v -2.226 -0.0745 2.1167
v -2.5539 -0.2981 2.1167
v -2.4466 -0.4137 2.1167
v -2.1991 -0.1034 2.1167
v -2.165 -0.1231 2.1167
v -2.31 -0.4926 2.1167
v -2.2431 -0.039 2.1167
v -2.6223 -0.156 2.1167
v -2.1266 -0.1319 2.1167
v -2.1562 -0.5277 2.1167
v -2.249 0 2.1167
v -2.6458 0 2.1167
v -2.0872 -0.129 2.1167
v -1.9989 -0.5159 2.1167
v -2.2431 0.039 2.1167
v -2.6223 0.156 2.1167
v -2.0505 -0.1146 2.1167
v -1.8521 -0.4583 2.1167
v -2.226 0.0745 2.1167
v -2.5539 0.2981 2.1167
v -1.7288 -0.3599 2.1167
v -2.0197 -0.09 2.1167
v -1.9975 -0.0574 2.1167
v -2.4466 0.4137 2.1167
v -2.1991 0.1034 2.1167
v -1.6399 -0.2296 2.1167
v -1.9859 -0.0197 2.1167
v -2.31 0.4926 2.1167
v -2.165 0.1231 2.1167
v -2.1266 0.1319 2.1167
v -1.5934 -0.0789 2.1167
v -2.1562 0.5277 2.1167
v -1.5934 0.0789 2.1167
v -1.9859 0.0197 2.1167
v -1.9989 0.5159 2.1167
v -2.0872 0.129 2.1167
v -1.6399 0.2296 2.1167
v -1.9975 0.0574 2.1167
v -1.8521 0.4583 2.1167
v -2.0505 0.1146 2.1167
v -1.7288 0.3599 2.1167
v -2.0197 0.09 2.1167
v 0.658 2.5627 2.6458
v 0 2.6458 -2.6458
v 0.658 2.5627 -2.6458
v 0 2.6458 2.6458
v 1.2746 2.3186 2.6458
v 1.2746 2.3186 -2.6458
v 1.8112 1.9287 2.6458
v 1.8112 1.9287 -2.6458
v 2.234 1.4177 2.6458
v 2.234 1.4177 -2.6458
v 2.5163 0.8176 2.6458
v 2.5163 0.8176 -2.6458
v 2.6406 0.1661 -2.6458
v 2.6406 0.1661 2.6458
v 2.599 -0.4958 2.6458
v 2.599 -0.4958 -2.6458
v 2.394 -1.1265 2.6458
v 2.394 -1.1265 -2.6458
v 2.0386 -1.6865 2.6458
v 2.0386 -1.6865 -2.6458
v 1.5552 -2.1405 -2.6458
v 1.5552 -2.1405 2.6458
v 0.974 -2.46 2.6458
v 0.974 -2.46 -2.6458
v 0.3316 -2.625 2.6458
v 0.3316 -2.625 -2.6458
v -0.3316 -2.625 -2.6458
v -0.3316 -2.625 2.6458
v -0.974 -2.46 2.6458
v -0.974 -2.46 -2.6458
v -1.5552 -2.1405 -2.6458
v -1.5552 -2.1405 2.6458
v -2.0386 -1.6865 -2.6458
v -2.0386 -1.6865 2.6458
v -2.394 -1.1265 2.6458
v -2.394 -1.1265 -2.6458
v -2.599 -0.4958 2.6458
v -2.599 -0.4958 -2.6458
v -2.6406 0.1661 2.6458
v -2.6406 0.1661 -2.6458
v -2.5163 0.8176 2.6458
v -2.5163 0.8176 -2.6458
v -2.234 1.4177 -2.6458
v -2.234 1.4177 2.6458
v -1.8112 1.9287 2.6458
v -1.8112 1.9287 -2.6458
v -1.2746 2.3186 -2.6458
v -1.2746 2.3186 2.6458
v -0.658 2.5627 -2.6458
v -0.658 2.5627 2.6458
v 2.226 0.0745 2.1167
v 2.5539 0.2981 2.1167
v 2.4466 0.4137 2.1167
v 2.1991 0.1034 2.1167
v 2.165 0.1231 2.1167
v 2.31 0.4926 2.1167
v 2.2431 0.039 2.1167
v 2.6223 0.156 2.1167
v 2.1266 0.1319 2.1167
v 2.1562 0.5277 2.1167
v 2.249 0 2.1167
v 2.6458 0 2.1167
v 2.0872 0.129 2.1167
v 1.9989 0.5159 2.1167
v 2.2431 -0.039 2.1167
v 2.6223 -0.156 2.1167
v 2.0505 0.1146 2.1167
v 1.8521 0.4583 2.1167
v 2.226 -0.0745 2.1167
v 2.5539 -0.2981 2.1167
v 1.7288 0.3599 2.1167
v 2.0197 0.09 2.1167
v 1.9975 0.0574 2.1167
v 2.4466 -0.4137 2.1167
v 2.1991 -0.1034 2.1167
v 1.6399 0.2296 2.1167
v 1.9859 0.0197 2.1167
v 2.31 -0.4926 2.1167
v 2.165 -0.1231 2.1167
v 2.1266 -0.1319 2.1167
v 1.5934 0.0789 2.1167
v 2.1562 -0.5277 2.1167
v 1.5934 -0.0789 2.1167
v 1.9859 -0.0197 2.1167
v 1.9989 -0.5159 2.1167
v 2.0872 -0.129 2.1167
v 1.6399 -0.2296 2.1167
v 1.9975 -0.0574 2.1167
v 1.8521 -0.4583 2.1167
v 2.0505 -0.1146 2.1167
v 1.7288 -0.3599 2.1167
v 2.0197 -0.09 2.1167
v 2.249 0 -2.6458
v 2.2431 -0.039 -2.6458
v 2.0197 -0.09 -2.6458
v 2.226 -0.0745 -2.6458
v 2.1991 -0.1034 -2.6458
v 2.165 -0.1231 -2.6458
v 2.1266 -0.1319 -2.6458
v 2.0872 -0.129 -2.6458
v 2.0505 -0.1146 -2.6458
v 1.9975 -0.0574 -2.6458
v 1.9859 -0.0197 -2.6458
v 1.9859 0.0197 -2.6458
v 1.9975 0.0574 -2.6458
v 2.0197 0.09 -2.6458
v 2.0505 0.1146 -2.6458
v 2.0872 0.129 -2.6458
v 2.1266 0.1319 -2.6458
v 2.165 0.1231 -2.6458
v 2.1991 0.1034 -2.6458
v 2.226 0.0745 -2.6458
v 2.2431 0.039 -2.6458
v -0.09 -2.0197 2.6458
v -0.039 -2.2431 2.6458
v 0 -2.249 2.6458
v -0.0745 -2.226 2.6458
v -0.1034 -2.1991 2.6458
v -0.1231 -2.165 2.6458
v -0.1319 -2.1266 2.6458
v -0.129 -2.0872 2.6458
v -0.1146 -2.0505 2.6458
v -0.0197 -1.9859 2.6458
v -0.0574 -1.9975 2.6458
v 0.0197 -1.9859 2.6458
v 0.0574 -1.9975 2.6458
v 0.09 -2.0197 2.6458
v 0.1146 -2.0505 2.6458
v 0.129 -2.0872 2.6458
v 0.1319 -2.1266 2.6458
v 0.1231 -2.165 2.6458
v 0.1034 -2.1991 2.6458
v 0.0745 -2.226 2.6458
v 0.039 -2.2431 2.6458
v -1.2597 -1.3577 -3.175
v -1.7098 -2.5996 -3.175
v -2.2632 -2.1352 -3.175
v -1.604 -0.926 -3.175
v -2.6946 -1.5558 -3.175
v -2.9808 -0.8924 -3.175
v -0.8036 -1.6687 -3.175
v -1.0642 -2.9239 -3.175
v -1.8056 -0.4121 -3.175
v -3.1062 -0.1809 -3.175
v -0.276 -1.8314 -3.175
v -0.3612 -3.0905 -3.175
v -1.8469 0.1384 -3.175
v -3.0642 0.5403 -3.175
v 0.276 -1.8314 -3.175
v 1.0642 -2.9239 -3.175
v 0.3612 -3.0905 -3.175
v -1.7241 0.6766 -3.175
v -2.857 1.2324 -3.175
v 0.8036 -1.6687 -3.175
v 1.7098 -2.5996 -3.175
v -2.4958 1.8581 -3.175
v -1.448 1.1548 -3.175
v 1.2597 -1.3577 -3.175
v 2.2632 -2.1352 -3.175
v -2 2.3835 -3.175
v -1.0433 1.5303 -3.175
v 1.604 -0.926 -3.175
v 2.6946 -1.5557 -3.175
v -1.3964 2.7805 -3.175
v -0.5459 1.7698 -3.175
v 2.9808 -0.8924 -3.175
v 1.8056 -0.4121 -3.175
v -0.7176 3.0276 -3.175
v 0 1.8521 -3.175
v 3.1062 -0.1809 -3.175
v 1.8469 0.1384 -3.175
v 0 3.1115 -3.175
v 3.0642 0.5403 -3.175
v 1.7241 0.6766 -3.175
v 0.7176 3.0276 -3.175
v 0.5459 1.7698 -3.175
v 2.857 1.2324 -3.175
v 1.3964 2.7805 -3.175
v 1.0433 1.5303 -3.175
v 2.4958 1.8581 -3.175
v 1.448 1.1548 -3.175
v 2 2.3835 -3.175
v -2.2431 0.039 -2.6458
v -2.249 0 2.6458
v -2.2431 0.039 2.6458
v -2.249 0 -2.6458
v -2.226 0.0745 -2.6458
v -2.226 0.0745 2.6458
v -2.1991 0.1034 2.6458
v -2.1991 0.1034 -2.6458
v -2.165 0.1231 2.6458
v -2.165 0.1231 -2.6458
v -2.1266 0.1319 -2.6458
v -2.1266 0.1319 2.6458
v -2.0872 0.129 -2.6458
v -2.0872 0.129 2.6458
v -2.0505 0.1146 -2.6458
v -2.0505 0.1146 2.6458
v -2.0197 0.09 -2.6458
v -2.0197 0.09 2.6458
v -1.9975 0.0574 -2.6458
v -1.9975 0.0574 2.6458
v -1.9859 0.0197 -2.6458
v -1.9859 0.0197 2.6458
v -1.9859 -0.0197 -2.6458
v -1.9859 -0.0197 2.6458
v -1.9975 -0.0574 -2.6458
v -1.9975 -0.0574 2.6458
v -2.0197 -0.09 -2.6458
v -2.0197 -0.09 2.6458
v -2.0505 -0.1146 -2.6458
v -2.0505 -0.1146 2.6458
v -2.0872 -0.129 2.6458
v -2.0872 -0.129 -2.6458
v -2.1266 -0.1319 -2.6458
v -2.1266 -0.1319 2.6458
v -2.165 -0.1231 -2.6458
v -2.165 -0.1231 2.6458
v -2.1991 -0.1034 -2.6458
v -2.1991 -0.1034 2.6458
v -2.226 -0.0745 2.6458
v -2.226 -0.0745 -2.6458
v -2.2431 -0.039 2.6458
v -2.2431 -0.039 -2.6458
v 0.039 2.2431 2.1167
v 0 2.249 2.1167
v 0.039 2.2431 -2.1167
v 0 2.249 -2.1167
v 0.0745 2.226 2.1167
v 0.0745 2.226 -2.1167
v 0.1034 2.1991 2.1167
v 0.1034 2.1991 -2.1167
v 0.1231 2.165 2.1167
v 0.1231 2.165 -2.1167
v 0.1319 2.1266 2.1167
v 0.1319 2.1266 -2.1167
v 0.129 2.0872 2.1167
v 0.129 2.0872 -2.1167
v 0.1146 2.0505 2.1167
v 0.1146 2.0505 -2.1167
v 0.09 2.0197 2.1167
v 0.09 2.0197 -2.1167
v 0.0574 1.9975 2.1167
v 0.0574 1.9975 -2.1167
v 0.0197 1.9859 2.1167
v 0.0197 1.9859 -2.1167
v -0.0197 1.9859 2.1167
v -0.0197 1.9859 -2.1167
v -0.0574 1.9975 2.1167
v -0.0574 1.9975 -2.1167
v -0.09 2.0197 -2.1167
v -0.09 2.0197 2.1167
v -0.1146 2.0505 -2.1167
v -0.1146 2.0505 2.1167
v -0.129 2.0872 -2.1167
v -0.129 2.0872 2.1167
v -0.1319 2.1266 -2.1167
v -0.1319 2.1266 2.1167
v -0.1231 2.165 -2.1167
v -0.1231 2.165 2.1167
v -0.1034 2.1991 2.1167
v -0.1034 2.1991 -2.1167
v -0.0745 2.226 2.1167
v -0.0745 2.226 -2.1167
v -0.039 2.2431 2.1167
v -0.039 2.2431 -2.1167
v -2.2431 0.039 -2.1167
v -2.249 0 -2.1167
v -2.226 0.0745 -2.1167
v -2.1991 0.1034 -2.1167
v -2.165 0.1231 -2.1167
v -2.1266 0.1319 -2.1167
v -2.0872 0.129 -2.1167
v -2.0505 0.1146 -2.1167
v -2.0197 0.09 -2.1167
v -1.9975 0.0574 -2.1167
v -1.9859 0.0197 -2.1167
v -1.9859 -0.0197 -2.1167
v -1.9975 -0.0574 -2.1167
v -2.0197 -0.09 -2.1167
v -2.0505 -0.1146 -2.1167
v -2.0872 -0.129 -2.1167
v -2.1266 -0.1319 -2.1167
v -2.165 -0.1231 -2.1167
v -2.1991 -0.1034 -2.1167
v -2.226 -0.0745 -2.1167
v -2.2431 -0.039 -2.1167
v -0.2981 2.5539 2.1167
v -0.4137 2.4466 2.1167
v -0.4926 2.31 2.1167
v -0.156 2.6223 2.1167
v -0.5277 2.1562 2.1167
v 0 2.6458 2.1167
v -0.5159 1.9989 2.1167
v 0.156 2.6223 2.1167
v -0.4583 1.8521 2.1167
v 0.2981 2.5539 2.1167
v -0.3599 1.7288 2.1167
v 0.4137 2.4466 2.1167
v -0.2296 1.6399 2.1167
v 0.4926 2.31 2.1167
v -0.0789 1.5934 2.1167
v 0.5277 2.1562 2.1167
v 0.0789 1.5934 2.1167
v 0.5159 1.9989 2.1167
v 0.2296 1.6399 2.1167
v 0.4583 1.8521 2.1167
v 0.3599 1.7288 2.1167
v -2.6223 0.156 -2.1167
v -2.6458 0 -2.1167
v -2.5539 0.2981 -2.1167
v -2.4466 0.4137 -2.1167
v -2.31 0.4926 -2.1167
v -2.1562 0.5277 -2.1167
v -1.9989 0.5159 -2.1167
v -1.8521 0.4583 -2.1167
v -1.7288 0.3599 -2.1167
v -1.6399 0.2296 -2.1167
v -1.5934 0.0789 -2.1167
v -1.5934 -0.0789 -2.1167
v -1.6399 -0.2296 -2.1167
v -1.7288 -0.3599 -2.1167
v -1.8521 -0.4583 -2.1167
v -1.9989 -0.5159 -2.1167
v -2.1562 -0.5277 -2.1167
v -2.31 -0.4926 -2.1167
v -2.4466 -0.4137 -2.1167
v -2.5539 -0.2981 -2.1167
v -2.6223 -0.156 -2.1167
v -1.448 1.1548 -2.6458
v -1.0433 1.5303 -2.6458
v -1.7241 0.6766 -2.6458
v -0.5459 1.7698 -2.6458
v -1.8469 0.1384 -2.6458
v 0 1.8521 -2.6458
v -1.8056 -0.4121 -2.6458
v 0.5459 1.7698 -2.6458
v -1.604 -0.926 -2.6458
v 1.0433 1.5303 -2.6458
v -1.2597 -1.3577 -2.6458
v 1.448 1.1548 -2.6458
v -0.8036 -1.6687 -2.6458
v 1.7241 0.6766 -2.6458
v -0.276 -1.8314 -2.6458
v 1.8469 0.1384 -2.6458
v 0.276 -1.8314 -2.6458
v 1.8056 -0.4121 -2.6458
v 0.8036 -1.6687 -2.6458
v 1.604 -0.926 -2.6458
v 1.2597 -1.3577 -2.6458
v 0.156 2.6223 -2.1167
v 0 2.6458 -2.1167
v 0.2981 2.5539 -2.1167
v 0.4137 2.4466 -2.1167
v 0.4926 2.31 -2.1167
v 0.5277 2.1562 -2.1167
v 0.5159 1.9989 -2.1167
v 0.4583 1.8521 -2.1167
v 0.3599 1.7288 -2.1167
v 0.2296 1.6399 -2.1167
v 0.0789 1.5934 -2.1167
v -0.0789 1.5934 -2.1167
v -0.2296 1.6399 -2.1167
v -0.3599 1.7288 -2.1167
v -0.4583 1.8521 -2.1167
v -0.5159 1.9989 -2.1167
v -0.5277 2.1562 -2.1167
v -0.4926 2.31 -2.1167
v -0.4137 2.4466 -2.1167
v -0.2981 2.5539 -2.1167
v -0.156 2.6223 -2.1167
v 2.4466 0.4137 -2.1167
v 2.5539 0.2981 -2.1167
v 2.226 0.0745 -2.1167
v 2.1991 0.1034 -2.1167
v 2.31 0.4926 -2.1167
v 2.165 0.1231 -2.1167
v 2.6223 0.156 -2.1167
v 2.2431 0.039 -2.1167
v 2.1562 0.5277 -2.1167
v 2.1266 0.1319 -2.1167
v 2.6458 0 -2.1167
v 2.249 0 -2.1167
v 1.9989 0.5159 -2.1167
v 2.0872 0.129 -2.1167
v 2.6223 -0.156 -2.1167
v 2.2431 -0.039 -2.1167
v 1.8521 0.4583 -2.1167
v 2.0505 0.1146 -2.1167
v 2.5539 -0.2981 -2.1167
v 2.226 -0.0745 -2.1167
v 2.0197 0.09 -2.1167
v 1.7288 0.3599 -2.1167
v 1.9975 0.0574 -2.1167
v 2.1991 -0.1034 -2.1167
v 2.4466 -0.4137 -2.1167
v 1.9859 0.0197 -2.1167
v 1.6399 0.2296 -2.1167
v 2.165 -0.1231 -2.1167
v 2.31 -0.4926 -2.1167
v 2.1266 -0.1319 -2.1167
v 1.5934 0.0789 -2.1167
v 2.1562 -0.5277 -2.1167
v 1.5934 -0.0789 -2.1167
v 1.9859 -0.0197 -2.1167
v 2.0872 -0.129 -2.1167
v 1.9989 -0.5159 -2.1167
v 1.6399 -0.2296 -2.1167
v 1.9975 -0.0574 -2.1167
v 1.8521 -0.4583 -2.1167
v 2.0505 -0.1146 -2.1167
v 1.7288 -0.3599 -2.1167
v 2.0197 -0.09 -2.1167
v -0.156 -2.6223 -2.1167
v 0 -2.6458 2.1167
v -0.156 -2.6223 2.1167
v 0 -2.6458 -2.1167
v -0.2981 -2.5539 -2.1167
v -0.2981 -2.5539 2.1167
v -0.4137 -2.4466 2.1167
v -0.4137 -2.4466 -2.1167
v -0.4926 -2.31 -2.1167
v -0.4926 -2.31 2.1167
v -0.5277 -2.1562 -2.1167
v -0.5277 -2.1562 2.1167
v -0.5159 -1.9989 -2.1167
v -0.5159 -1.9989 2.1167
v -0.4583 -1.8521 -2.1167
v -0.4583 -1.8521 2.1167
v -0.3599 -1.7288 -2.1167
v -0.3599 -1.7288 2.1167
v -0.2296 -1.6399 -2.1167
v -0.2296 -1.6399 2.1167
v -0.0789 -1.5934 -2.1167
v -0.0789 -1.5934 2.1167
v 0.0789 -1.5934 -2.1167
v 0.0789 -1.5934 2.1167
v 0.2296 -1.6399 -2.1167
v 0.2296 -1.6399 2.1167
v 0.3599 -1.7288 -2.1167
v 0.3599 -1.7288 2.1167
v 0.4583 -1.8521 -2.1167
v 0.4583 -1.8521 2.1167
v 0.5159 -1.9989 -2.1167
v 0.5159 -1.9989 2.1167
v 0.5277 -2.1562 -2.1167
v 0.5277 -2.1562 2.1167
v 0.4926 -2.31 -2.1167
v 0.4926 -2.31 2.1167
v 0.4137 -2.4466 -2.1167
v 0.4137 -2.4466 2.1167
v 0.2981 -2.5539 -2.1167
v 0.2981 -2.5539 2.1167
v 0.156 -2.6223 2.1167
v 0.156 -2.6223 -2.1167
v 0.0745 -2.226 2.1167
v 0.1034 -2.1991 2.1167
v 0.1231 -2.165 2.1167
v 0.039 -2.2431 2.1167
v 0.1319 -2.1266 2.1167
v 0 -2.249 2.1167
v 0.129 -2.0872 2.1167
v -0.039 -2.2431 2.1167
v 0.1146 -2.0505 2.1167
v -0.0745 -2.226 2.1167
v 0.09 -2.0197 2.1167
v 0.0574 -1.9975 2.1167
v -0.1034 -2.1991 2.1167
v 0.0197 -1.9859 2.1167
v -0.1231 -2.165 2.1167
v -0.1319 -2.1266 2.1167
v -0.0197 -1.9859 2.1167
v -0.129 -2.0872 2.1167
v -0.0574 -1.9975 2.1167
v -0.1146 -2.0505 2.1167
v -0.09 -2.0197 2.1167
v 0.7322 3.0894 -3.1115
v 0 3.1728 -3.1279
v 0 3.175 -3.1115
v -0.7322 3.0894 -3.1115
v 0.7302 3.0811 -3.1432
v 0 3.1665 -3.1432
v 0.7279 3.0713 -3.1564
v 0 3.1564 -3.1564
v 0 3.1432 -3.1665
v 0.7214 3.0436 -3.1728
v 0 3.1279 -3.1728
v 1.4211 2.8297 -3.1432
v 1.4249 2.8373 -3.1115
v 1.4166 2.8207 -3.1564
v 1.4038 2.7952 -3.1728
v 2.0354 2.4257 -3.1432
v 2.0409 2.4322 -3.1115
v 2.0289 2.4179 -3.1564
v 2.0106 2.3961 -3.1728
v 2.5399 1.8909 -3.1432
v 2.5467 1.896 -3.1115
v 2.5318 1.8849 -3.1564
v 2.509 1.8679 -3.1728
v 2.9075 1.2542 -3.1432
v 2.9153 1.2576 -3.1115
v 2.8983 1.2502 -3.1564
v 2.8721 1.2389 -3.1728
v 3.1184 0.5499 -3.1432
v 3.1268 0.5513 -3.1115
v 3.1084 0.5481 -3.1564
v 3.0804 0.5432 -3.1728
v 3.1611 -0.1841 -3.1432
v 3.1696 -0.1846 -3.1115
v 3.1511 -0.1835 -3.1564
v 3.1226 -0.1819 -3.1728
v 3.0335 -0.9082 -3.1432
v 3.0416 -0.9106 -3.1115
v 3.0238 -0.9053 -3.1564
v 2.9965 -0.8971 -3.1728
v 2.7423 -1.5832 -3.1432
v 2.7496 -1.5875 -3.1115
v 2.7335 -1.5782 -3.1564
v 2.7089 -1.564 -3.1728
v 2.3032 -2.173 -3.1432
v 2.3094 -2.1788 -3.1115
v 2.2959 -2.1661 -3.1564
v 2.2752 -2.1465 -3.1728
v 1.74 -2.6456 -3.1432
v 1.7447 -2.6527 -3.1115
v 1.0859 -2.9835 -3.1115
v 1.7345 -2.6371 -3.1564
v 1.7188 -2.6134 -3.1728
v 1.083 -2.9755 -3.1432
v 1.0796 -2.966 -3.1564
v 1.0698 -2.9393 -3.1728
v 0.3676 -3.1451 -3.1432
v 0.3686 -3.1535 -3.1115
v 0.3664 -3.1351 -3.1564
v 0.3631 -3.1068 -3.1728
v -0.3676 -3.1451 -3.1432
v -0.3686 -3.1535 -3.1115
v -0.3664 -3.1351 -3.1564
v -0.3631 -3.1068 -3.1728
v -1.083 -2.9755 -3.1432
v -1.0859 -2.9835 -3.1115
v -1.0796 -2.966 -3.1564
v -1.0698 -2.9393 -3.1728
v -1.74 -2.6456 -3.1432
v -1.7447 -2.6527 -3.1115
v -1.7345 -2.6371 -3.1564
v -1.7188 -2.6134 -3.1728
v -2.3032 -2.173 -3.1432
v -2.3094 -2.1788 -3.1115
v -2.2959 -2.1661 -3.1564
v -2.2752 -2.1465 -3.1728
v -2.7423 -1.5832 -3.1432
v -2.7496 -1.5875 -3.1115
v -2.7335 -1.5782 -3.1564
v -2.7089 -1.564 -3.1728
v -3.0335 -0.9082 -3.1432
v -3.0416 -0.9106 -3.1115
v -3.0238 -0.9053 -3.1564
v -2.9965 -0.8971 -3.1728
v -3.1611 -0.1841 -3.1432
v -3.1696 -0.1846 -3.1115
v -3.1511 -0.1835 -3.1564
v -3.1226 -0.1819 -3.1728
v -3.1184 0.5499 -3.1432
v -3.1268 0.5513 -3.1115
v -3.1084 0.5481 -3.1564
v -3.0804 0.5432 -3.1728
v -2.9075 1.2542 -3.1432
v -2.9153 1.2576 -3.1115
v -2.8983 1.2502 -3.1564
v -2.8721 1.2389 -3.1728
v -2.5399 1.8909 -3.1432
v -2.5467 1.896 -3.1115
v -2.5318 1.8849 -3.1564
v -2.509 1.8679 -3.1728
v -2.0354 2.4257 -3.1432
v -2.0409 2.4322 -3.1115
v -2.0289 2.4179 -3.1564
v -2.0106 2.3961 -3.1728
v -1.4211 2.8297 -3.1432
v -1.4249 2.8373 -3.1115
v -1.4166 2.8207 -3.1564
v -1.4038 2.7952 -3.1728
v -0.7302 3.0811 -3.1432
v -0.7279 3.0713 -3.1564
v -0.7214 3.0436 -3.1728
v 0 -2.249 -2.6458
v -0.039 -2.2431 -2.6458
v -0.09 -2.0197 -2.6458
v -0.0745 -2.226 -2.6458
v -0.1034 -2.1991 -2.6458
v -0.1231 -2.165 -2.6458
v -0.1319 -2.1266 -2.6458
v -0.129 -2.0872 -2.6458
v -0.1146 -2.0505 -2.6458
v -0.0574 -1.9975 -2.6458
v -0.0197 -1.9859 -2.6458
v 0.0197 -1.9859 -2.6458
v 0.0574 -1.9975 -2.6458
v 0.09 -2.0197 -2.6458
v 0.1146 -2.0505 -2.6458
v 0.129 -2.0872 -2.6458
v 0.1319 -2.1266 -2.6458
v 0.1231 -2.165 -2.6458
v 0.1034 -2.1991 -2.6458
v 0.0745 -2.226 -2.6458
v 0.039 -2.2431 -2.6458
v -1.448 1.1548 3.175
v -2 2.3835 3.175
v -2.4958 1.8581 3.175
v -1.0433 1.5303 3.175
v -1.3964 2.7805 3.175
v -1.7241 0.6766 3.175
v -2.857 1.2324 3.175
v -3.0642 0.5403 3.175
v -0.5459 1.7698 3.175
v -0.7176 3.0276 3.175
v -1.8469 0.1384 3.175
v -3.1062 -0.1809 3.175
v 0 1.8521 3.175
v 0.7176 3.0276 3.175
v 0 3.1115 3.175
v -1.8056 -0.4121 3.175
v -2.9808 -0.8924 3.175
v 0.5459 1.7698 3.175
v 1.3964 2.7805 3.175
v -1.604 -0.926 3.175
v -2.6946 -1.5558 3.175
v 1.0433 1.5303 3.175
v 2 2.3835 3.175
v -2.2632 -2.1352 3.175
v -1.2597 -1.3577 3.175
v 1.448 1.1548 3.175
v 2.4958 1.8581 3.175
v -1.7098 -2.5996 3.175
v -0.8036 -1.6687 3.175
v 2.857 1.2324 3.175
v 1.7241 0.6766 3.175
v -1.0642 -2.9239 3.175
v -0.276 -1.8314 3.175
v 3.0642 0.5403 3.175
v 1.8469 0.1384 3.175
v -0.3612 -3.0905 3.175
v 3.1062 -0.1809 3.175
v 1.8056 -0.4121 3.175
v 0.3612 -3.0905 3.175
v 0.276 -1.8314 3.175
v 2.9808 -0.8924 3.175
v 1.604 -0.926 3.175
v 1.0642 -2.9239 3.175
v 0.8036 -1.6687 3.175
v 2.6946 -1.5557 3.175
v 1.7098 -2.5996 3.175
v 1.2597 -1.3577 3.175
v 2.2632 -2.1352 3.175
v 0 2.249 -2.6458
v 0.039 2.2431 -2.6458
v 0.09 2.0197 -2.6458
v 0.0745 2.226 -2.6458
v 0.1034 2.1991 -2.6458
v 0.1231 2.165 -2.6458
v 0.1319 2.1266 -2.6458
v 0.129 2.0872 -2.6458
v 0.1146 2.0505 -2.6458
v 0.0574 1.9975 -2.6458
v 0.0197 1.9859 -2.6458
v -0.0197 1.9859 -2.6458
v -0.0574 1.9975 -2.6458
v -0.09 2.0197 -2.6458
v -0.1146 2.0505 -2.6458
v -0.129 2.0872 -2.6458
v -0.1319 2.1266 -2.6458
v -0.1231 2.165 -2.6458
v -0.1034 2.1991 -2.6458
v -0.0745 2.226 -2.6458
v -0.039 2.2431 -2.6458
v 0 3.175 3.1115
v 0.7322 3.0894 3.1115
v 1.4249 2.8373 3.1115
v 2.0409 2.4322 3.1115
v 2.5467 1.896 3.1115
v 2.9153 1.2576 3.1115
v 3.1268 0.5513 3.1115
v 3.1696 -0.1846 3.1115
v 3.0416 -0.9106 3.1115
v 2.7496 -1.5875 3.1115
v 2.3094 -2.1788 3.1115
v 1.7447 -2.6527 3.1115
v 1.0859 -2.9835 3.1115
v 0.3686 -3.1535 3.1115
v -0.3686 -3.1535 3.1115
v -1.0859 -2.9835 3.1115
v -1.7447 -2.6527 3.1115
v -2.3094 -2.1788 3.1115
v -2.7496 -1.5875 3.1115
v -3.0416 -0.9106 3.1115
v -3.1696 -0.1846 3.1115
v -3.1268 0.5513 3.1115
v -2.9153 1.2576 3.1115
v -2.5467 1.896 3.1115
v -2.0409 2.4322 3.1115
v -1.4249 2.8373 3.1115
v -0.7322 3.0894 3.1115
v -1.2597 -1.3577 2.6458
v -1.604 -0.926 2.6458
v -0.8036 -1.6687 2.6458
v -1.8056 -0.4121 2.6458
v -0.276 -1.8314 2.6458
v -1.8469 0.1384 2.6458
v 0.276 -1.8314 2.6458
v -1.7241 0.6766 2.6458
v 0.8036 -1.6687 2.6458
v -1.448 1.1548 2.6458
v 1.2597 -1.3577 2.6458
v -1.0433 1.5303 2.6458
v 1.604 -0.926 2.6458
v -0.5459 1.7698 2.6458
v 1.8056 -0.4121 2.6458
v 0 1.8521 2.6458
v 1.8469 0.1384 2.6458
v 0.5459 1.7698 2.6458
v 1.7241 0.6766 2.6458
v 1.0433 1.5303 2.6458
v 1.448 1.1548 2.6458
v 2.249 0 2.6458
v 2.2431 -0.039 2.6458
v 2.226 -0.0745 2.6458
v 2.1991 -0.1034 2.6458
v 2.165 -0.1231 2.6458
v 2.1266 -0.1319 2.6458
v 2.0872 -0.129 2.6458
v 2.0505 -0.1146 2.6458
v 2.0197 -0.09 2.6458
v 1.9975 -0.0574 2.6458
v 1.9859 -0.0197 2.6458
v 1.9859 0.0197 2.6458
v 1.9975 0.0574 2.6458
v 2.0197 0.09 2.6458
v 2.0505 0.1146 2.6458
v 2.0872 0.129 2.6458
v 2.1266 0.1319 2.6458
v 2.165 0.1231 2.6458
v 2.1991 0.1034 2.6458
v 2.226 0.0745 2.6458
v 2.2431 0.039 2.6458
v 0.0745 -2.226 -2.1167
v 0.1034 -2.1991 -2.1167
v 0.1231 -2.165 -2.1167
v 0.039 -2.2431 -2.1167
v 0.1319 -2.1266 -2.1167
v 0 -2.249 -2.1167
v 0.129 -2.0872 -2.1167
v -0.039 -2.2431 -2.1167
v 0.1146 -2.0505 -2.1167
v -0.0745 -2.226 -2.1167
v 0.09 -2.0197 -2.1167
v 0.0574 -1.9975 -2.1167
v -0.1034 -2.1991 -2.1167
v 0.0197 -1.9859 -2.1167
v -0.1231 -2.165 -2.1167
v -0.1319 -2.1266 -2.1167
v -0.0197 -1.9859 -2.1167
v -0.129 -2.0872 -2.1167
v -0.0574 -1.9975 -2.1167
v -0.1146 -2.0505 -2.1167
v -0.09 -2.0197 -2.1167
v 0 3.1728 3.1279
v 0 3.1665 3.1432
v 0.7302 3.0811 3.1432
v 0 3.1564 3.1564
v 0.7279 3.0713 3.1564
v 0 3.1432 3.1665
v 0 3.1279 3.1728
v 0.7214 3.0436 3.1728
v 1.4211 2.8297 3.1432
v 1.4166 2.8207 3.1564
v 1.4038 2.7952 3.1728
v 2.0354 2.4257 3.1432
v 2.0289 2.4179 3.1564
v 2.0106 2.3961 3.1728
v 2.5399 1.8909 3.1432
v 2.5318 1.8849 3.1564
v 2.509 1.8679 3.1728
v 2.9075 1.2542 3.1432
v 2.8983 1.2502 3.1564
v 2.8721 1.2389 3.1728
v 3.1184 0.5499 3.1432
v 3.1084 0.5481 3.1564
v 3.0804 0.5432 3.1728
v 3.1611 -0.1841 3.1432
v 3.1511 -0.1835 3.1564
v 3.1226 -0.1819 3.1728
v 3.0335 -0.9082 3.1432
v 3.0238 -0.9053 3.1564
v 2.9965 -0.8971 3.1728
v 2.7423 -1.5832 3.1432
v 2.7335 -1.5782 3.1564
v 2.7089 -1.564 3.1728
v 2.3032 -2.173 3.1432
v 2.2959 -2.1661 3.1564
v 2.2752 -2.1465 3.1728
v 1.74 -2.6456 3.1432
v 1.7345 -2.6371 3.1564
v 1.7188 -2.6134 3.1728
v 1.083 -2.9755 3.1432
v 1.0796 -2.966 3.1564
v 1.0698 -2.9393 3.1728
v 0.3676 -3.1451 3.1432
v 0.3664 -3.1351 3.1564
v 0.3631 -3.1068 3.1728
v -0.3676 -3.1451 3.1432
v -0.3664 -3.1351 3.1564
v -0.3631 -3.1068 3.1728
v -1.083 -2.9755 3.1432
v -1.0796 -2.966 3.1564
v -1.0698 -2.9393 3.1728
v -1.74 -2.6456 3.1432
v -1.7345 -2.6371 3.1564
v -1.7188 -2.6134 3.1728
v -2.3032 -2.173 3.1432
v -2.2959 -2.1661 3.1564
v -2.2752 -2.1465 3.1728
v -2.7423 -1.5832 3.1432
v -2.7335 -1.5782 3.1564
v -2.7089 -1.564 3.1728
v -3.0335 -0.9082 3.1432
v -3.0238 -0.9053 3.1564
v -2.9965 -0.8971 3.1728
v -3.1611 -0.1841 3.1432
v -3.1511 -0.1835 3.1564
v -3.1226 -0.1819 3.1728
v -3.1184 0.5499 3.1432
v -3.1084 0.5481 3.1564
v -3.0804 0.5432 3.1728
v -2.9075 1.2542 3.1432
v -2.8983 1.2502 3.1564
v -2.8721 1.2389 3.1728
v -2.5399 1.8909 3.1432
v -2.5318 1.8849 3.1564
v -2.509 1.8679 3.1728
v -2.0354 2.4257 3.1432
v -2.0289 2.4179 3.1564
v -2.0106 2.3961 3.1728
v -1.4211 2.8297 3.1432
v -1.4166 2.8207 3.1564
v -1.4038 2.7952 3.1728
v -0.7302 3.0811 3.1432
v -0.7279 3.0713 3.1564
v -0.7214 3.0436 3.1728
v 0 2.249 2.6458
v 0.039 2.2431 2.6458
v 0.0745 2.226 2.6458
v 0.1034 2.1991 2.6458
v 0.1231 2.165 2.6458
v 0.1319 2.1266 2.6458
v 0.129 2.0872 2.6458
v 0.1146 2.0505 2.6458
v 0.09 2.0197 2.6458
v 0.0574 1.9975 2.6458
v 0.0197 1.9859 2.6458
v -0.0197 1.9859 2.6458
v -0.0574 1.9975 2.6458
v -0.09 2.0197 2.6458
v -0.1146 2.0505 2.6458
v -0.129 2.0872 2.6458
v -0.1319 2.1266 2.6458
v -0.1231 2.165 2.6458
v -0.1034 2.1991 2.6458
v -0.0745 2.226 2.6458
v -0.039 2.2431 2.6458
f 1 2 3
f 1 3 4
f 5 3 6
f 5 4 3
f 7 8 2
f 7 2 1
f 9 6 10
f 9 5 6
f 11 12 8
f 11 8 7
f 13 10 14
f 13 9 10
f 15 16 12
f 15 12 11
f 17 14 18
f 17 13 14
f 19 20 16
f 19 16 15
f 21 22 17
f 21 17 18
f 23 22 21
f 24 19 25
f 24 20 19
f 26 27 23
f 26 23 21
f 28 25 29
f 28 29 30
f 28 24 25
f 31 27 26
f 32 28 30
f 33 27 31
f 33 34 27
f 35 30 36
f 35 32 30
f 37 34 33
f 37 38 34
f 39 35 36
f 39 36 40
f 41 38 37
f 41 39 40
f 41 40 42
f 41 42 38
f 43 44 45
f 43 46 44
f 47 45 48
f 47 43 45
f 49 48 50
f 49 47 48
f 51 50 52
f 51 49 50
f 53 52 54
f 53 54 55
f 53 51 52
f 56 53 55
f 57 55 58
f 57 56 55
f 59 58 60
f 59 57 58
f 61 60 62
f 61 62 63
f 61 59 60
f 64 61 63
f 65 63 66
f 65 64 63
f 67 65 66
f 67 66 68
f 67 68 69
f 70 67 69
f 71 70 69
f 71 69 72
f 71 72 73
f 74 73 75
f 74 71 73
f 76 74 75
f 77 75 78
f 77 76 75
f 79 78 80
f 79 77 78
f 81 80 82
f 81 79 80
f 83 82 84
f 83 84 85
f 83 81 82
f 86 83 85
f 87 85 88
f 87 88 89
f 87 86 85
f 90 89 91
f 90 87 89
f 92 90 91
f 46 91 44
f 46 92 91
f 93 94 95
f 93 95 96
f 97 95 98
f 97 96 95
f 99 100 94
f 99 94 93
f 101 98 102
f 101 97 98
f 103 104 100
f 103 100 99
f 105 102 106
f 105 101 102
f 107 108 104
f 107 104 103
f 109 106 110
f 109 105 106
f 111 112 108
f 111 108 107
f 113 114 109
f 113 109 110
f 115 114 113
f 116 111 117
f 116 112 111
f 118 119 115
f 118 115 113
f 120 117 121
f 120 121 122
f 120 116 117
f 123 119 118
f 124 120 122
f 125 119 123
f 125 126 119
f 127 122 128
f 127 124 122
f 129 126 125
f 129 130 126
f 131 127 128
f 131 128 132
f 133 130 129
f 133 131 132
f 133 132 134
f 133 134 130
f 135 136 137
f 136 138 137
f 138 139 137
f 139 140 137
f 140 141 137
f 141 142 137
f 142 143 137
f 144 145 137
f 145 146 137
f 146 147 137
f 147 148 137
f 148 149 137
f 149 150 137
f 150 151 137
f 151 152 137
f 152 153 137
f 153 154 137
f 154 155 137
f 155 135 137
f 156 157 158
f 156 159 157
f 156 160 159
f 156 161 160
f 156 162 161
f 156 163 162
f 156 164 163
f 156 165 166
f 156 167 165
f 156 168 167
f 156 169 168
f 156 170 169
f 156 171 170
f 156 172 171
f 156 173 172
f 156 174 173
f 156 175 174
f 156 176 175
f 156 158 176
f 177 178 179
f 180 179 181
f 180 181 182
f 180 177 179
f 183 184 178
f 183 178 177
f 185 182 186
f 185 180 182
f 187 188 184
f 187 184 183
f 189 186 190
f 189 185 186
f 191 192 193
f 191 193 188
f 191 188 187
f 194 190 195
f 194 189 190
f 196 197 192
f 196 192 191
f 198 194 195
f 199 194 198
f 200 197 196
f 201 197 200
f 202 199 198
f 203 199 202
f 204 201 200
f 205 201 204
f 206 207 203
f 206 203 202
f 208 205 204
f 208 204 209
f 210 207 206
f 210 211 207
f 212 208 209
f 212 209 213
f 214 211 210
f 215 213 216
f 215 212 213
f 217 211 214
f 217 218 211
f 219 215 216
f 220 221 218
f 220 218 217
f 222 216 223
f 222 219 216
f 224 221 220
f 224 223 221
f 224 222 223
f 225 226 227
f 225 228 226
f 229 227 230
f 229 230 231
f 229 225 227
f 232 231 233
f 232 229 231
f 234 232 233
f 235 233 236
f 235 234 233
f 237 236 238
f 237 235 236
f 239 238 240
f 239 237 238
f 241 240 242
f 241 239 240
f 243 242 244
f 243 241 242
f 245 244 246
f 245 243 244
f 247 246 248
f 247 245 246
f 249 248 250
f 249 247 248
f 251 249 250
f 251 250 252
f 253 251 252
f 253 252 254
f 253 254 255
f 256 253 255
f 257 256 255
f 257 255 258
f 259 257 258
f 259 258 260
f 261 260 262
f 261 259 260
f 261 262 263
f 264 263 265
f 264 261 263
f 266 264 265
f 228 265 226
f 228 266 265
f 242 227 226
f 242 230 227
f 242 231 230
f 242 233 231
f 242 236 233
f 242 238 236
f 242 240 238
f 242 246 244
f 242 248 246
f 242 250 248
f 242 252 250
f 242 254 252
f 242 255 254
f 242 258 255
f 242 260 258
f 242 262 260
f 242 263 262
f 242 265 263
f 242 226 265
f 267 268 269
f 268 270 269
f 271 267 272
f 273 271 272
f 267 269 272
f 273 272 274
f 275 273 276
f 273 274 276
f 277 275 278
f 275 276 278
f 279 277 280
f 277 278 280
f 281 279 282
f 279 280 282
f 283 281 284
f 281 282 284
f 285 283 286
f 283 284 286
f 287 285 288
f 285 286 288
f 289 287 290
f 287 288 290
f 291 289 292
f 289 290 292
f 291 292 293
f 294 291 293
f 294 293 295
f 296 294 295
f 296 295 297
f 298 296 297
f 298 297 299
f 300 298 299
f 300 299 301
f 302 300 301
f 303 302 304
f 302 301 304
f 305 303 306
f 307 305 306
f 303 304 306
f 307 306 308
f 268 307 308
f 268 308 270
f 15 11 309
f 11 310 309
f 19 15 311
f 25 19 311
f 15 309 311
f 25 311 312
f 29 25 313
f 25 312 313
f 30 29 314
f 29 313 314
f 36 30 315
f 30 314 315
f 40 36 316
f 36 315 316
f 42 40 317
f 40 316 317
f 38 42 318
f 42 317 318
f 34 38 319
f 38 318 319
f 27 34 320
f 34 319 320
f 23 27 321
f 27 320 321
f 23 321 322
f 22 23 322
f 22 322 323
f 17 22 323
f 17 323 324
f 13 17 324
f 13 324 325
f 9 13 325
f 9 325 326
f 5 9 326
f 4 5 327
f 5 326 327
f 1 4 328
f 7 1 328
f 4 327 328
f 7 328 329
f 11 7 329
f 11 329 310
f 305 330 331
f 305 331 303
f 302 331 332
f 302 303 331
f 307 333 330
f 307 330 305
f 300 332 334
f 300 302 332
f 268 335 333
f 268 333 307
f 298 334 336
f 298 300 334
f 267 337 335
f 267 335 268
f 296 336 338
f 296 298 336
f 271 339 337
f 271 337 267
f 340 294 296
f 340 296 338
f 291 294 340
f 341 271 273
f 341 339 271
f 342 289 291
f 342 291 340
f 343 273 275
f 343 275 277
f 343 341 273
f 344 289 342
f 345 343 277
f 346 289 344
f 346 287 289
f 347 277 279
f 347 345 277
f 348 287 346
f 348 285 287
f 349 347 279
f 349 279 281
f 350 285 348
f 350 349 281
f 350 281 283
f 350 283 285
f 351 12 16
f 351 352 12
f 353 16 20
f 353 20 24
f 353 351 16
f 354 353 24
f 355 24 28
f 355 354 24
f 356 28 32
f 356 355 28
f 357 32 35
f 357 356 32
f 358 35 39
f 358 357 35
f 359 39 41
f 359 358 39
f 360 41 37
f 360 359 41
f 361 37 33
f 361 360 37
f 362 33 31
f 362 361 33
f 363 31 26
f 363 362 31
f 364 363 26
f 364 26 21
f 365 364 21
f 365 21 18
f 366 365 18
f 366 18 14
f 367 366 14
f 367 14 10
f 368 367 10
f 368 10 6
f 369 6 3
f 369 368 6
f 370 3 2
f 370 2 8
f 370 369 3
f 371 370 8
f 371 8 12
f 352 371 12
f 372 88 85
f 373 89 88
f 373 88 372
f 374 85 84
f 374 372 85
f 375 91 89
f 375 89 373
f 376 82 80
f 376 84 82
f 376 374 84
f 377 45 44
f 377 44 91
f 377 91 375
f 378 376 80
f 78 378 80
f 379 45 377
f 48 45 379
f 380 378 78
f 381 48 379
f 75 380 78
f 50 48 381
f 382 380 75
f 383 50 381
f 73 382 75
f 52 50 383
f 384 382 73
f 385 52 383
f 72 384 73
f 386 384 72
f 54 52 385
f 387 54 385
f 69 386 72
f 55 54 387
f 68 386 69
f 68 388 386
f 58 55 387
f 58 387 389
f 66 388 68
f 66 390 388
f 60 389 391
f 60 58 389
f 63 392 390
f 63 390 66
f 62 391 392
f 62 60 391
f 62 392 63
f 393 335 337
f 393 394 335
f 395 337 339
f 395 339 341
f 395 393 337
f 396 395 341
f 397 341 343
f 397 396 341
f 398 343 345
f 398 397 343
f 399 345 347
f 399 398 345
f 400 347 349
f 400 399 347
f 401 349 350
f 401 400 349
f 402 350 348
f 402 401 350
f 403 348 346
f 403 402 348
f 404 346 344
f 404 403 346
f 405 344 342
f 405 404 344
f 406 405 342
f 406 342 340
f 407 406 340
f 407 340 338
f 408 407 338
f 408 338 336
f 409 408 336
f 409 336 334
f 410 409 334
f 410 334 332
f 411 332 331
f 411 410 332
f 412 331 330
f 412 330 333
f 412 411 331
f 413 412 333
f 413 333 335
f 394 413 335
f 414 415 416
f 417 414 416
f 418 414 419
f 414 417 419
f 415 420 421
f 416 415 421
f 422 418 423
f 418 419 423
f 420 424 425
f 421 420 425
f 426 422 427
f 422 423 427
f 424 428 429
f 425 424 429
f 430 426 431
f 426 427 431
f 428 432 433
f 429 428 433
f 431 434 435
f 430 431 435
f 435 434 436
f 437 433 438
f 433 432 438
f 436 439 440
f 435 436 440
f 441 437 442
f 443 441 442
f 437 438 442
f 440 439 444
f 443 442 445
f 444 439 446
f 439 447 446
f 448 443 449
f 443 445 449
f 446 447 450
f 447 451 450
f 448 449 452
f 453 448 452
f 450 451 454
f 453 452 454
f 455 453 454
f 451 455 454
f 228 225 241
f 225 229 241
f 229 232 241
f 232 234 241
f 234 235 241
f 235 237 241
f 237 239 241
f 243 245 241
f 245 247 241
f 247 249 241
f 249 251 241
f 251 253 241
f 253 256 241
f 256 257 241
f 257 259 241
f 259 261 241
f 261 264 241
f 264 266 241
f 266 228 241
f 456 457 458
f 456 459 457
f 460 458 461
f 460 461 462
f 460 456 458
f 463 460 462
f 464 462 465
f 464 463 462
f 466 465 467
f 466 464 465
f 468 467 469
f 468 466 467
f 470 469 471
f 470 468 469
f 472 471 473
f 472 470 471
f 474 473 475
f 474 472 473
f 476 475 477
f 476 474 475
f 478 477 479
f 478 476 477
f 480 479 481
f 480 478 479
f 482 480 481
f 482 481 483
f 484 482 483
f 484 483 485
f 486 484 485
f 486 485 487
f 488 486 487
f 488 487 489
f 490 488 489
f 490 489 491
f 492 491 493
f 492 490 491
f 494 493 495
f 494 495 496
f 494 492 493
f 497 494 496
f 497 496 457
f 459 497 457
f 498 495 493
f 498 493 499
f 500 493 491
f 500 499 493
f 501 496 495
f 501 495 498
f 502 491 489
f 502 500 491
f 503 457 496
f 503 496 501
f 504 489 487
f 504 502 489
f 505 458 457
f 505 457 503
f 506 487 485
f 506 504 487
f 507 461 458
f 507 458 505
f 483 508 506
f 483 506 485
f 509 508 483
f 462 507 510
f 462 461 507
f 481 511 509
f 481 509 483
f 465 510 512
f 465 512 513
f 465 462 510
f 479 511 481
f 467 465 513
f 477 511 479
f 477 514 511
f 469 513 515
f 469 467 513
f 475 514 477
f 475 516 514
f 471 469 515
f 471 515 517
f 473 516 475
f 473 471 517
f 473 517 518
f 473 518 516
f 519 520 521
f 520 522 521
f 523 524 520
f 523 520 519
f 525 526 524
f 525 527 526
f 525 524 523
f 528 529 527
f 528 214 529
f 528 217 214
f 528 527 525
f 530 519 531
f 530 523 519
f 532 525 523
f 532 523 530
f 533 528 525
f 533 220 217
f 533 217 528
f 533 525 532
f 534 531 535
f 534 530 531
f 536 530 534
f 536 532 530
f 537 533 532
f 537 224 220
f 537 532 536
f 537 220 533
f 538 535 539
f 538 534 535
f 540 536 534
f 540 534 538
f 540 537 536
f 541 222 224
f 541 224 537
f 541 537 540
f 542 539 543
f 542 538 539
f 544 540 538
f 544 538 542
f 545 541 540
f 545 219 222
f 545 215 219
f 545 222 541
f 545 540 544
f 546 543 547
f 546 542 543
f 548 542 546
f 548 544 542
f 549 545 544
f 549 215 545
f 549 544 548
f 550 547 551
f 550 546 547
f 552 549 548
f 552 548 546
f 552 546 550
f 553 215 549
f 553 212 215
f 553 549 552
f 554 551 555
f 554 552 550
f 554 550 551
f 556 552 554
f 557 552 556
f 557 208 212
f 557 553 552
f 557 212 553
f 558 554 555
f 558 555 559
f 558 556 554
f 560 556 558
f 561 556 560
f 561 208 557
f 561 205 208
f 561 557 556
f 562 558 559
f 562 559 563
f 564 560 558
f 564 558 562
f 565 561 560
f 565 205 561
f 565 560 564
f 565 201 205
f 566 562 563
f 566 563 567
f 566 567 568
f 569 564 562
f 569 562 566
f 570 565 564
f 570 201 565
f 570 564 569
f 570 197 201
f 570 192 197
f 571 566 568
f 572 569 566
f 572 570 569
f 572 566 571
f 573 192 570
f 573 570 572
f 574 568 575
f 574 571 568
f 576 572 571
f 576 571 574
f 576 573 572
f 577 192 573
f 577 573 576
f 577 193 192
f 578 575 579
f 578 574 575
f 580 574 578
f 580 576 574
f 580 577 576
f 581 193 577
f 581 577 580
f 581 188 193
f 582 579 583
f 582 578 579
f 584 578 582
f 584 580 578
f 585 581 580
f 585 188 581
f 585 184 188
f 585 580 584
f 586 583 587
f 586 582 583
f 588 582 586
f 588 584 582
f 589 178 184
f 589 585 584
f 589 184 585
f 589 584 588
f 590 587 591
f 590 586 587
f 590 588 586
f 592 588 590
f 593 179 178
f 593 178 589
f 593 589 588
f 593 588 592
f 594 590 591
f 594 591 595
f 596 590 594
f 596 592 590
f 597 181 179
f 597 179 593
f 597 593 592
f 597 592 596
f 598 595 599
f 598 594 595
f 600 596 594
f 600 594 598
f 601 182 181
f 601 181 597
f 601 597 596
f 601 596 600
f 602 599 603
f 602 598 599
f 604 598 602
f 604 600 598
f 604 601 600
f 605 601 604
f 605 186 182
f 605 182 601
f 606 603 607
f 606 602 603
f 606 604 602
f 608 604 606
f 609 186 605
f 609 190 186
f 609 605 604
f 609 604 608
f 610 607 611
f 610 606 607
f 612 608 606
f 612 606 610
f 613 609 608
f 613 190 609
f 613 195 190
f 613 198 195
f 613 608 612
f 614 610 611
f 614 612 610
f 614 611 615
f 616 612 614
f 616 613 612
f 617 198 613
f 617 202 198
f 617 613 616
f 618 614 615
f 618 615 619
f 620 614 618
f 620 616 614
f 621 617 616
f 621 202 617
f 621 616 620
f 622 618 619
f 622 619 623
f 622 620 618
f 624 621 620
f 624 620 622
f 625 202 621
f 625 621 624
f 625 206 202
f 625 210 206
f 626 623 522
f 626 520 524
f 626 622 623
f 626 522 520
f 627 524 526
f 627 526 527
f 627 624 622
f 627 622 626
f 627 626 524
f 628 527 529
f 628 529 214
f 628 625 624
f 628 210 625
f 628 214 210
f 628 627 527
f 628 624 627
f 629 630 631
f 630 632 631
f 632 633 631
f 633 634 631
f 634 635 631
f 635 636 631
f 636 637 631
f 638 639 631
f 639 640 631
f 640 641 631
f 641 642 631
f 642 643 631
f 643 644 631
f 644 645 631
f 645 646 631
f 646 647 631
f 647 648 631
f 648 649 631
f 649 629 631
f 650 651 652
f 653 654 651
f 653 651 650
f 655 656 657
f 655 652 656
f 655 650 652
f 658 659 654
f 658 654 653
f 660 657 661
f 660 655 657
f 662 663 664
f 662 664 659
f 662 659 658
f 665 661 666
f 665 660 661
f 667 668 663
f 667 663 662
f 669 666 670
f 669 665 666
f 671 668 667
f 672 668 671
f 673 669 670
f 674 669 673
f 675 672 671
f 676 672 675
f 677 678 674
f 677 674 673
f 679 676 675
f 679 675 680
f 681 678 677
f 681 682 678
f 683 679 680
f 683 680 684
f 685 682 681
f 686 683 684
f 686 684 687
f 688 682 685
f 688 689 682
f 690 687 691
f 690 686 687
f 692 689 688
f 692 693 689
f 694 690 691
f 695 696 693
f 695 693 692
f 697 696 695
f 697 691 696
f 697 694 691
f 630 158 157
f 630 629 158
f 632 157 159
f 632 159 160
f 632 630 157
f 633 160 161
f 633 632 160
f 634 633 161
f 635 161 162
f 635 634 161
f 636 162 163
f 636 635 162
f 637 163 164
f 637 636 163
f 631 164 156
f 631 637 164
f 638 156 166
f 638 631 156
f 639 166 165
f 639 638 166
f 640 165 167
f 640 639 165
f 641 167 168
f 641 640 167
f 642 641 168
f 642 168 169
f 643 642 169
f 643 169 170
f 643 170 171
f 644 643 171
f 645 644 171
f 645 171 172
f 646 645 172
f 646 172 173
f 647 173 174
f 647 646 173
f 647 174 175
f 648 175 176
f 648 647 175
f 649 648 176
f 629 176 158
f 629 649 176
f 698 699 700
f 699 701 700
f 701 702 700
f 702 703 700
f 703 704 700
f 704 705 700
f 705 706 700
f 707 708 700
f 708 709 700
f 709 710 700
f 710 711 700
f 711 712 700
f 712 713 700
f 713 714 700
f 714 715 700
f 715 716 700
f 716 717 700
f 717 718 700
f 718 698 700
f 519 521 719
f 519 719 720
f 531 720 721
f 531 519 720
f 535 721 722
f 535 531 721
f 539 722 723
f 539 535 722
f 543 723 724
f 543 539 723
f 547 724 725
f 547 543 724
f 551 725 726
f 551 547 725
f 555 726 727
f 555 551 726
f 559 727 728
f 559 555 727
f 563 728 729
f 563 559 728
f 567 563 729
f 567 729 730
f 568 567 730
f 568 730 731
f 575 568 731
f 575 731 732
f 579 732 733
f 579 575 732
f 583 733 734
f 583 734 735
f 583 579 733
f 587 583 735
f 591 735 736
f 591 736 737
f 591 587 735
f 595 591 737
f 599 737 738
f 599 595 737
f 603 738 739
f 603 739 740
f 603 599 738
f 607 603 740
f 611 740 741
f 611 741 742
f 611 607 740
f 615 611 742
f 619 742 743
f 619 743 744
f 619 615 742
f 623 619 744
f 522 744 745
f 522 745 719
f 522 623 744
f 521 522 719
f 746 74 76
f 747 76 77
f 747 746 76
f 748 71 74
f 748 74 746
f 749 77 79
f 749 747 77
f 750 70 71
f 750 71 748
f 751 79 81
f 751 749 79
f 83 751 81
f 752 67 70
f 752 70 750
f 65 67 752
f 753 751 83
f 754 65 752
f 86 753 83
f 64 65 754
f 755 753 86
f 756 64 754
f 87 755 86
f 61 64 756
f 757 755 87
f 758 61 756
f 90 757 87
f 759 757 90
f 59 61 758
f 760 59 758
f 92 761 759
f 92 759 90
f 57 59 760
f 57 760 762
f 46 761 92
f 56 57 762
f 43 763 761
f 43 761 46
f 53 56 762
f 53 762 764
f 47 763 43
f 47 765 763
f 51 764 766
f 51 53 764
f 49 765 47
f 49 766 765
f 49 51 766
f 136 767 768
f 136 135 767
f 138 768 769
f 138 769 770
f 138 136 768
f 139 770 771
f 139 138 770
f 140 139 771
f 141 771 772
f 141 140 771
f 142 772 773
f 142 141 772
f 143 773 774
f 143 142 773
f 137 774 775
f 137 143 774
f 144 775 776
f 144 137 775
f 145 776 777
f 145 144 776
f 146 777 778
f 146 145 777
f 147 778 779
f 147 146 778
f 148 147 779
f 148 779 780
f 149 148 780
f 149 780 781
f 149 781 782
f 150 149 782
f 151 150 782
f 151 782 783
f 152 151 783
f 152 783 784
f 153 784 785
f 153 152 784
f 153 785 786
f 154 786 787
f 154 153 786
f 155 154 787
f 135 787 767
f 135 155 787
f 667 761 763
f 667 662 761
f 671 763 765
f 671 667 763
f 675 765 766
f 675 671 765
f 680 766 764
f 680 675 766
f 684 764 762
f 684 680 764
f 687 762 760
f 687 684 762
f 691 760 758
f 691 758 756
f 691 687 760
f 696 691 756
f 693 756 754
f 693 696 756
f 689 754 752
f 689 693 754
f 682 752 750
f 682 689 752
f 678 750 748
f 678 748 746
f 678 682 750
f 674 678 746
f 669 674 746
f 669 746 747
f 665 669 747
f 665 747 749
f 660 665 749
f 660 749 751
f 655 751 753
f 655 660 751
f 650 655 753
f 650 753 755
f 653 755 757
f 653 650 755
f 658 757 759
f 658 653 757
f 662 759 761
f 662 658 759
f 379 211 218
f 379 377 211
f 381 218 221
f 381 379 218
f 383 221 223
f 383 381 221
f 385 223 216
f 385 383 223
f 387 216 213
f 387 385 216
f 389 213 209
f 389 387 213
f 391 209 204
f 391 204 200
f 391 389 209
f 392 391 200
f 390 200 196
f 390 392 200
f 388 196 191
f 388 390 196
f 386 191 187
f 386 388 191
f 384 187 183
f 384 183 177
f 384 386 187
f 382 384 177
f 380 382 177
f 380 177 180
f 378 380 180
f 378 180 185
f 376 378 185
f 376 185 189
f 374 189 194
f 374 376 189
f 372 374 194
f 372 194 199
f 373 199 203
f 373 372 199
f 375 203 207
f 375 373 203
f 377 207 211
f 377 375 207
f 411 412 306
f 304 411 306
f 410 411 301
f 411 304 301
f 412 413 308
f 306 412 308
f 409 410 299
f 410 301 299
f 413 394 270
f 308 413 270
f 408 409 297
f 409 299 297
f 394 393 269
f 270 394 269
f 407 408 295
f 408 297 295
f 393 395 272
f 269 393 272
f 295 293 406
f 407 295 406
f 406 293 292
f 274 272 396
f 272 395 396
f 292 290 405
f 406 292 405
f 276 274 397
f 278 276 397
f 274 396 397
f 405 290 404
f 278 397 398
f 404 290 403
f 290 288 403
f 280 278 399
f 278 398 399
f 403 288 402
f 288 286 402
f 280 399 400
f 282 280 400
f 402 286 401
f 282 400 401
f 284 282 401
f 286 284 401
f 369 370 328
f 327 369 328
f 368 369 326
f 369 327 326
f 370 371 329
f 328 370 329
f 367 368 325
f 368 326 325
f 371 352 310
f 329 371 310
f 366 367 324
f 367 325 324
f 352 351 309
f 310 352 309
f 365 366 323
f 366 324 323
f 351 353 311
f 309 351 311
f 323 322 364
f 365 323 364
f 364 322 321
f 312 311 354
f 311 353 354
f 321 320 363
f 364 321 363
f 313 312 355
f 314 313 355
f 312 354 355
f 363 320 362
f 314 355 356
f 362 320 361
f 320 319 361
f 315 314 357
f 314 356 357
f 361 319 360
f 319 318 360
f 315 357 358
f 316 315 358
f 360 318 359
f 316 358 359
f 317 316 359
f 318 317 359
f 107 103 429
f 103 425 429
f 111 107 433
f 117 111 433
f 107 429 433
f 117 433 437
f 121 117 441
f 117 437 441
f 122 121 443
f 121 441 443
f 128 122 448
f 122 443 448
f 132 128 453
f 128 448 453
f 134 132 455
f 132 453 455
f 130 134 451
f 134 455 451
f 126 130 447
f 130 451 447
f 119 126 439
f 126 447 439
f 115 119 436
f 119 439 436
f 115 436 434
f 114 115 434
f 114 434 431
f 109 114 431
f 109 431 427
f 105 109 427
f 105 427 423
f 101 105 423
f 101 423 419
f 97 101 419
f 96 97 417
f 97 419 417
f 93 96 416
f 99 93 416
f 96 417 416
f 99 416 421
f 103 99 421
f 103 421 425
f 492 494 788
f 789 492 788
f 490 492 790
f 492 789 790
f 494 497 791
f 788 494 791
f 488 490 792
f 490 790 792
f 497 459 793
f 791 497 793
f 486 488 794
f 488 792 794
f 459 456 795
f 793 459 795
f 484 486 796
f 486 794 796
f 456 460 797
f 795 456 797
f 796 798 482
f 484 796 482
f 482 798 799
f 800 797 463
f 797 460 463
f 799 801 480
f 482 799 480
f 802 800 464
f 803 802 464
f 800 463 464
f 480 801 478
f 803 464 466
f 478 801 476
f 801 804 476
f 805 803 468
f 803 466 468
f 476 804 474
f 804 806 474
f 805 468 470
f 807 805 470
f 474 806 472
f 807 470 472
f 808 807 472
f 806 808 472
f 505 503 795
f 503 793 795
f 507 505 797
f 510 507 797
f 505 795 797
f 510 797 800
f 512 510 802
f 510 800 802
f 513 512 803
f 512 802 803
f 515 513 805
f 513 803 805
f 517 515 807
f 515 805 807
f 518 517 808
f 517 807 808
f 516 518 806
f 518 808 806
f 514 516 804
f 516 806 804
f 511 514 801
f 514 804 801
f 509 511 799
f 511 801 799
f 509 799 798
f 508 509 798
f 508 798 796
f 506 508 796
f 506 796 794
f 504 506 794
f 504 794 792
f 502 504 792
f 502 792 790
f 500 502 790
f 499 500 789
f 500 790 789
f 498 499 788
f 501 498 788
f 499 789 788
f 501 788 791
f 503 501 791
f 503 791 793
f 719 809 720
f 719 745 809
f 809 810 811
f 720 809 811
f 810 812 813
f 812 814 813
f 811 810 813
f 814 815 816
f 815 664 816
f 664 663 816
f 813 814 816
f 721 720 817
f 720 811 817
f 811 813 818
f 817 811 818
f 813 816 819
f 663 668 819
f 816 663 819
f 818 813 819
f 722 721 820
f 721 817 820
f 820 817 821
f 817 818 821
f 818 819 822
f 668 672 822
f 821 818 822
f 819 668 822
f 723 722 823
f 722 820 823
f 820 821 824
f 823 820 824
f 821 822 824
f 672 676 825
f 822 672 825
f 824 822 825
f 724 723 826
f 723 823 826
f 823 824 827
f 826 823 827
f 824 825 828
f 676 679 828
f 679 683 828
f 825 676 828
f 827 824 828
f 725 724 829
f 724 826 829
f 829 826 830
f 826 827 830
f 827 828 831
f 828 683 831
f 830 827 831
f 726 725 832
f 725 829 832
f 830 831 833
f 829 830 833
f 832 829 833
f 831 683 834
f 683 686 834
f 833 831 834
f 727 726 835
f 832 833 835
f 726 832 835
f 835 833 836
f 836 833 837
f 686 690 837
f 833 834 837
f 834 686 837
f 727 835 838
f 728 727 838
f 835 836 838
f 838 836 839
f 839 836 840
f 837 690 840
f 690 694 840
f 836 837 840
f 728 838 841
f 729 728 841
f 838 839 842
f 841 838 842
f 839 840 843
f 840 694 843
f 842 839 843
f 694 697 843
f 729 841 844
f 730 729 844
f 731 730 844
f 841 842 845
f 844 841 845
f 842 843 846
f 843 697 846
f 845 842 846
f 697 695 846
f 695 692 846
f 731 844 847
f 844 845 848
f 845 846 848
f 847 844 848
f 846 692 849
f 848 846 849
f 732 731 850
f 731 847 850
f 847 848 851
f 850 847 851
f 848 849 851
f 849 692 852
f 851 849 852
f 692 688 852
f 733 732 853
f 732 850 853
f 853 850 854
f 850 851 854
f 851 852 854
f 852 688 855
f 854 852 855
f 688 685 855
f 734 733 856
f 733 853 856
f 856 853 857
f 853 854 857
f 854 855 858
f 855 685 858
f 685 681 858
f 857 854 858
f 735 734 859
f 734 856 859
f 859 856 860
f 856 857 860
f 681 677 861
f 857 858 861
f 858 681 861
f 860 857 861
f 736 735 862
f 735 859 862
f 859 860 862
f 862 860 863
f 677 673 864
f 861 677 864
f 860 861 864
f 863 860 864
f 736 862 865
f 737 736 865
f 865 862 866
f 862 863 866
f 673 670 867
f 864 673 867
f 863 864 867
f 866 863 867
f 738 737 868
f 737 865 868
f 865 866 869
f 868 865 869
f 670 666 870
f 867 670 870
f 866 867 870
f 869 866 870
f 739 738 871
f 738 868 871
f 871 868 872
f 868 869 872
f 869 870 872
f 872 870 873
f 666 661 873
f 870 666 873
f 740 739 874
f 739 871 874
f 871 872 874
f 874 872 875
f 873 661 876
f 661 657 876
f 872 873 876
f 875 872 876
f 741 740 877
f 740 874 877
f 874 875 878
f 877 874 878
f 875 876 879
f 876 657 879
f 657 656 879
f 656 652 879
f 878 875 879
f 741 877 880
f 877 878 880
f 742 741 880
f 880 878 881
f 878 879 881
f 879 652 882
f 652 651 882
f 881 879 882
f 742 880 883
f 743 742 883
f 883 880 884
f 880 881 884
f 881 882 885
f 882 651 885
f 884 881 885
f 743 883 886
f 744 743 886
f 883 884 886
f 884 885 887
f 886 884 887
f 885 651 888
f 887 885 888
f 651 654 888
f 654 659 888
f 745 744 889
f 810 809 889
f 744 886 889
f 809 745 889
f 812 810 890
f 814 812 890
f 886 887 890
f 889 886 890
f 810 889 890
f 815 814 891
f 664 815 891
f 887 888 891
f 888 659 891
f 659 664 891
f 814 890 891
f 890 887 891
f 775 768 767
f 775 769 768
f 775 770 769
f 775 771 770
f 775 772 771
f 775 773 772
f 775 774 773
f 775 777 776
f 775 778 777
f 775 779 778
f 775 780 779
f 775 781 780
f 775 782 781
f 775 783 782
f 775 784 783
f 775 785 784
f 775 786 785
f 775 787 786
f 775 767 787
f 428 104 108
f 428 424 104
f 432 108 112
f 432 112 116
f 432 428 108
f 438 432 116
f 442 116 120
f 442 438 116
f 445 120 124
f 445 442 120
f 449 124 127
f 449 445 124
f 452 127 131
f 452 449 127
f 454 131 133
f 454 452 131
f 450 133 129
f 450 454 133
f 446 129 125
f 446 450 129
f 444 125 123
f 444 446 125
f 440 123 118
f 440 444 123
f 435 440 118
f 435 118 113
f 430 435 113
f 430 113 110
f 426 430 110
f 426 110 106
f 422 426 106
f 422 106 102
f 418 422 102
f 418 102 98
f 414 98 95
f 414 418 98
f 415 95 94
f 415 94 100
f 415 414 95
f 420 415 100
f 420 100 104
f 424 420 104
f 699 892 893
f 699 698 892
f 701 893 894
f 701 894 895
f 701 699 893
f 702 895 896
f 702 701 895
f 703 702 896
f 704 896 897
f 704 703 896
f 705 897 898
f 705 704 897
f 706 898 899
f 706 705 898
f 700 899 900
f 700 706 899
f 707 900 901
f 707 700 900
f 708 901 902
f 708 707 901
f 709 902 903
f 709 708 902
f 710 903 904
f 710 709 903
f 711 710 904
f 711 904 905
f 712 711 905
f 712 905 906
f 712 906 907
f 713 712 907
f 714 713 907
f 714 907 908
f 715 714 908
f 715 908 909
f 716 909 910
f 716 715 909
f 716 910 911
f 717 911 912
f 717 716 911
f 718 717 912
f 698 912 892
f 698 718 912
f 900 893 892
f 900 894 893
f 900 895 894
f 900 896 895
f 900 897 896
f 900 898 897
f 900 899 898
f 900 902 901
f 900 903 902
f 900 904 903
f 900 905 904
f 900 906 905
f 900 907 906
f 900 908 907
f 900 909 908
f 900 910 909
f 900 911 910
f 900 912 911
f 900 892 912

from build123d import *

# Parameters (mm, degrees)
SKETCH2_W         = 4.233333334
SKETCH2_H         = 0.396875
SKETCH3_W         = 5.291666666
SKETCH3_H         = 0.132291666
CIRPATTERN1_COUNT = 4
CIRPATTERN1_ANGLE = 270
FILLET1_R         = 0.0635


with BuildPart() as part:
    # Sketch1 → Revolve1 (revolve)
    with BuildSketch(Plane(origin=(0, 0, 0), x_dir=(0, 0, -1), z_dir=(1, 0, 0))):
        Polygon((-3.175, 3.175), (3.175, 3.175), (3.175, 1.852083333), (2.645833333, 1.852083333), (2.645833333, 2.645833333), (-2.645833333, 2.645833333), (-2.645833333, 1.852083333), (-3.175, 1.852083333), align=None)
    revolve(axis=Axis((0, 0, 3.175), (0, 0, -1)))

    # Fillet1
    fillet1_edges = [part.edges().sort_by_distance(p)[0] for p in [
        (0, -3.175, 3.175),
        (0, -3.175, -3.175),
    ]]
    fillet(fillet1_edges, radius=FILLET1_R)


with BuildPart() as body_2:
    # Sketch2 → Revolve2 (revolve)
    with BuildSketch(Plane(origin=(0, 0, 0), x_dir=(0, 0, -1), z_dir=(1, 0, 0))):
        with Locations((0, 2.447395833)):
            Rectangle(SKETCH2_W, SKETCH2_H)
    revolve(axis=Axis((0, 2.116666667, 2.116666667), (0, 0, -1)))


with BuildPart() as body_3:
    # Sketch3 → Revolve3 (revolve)
    with BuildSketch(Plane(origin=(0, 0, 0), x_dir=(0, 0, -1), z_dir=(1, 0, 0))):
        with Locations((0, 2.1828125)):
            Rectangle(SKETCH3_W, SKETCH3_H)
    revolve(axis=Axis((0, 2.116666667, 2.645833333), (0, 0, -1)))


with BuildPart() as cirpattern1_1:
    # CirPattern1: pattern copy
    add(body_2.part.rotate(Axis((0, 0, -3.175), (0, 0, 1)), 1 * CIRPATTERN1_ANGLE / (CIRPATTERN1_COUNT - 1)))


with BuildPart() as cirpattern1_2:
    # CirPattern1: pattern copy
    add(body_2.part.rotate(Axis((0, 0, -3.175), (0, 0, 1)), 2 * CIRPATTERN1_ANGLE / (CIRPATTERN1_COUNT - 1)))


with BuildPart() as cirpattern1_3:
    # CirPattern1: pattern copy
    add(body_2.part.rotate(Axis((0, 0, -3.175), (0, 0, 1)), 3 * CIRPATTERN1_ANGLE / (CIRPATTERN1_COUNT - 1)))


with BuildPart() as cirpattern1_4:
    # CirPattern1: pattern copy
    add(body_3.part.rotate(Axis((0, 0, -3.175), (0, 0, 1)), 1 * CIRPATTERN1_ANGLE / (CIRPATTERN1_COUNT - 1)))


with BuildPart() as cirpattern1_5:
    # CirPattern1: pattern copy
    add(body_3.part.rotate(Axis((0, 0, -3.175), (0, 0, 1)), 2 * CIRPATTERN1_ANGLE / (CIRPATTERN1_COUNT - 1)))


with BuildPart() as cirpattern1_6:
    # CirPattern1: pattern copy
    add(body_3.part.rotate(Axis((0, 0, -3.175), (0, 0, 1)), 3 * CIRPATTERN1_ANGLE / (CIRPATTERN1_COUNT - 1)))


solid = Compound([part.part, body_2.part, body_3.part, cirpattern1_1.part, cirpattern1_2.part, cirpattern1_3.part, cirpattern1_4.part, cirpattern1_5.part, cirpattern1_6.part])
